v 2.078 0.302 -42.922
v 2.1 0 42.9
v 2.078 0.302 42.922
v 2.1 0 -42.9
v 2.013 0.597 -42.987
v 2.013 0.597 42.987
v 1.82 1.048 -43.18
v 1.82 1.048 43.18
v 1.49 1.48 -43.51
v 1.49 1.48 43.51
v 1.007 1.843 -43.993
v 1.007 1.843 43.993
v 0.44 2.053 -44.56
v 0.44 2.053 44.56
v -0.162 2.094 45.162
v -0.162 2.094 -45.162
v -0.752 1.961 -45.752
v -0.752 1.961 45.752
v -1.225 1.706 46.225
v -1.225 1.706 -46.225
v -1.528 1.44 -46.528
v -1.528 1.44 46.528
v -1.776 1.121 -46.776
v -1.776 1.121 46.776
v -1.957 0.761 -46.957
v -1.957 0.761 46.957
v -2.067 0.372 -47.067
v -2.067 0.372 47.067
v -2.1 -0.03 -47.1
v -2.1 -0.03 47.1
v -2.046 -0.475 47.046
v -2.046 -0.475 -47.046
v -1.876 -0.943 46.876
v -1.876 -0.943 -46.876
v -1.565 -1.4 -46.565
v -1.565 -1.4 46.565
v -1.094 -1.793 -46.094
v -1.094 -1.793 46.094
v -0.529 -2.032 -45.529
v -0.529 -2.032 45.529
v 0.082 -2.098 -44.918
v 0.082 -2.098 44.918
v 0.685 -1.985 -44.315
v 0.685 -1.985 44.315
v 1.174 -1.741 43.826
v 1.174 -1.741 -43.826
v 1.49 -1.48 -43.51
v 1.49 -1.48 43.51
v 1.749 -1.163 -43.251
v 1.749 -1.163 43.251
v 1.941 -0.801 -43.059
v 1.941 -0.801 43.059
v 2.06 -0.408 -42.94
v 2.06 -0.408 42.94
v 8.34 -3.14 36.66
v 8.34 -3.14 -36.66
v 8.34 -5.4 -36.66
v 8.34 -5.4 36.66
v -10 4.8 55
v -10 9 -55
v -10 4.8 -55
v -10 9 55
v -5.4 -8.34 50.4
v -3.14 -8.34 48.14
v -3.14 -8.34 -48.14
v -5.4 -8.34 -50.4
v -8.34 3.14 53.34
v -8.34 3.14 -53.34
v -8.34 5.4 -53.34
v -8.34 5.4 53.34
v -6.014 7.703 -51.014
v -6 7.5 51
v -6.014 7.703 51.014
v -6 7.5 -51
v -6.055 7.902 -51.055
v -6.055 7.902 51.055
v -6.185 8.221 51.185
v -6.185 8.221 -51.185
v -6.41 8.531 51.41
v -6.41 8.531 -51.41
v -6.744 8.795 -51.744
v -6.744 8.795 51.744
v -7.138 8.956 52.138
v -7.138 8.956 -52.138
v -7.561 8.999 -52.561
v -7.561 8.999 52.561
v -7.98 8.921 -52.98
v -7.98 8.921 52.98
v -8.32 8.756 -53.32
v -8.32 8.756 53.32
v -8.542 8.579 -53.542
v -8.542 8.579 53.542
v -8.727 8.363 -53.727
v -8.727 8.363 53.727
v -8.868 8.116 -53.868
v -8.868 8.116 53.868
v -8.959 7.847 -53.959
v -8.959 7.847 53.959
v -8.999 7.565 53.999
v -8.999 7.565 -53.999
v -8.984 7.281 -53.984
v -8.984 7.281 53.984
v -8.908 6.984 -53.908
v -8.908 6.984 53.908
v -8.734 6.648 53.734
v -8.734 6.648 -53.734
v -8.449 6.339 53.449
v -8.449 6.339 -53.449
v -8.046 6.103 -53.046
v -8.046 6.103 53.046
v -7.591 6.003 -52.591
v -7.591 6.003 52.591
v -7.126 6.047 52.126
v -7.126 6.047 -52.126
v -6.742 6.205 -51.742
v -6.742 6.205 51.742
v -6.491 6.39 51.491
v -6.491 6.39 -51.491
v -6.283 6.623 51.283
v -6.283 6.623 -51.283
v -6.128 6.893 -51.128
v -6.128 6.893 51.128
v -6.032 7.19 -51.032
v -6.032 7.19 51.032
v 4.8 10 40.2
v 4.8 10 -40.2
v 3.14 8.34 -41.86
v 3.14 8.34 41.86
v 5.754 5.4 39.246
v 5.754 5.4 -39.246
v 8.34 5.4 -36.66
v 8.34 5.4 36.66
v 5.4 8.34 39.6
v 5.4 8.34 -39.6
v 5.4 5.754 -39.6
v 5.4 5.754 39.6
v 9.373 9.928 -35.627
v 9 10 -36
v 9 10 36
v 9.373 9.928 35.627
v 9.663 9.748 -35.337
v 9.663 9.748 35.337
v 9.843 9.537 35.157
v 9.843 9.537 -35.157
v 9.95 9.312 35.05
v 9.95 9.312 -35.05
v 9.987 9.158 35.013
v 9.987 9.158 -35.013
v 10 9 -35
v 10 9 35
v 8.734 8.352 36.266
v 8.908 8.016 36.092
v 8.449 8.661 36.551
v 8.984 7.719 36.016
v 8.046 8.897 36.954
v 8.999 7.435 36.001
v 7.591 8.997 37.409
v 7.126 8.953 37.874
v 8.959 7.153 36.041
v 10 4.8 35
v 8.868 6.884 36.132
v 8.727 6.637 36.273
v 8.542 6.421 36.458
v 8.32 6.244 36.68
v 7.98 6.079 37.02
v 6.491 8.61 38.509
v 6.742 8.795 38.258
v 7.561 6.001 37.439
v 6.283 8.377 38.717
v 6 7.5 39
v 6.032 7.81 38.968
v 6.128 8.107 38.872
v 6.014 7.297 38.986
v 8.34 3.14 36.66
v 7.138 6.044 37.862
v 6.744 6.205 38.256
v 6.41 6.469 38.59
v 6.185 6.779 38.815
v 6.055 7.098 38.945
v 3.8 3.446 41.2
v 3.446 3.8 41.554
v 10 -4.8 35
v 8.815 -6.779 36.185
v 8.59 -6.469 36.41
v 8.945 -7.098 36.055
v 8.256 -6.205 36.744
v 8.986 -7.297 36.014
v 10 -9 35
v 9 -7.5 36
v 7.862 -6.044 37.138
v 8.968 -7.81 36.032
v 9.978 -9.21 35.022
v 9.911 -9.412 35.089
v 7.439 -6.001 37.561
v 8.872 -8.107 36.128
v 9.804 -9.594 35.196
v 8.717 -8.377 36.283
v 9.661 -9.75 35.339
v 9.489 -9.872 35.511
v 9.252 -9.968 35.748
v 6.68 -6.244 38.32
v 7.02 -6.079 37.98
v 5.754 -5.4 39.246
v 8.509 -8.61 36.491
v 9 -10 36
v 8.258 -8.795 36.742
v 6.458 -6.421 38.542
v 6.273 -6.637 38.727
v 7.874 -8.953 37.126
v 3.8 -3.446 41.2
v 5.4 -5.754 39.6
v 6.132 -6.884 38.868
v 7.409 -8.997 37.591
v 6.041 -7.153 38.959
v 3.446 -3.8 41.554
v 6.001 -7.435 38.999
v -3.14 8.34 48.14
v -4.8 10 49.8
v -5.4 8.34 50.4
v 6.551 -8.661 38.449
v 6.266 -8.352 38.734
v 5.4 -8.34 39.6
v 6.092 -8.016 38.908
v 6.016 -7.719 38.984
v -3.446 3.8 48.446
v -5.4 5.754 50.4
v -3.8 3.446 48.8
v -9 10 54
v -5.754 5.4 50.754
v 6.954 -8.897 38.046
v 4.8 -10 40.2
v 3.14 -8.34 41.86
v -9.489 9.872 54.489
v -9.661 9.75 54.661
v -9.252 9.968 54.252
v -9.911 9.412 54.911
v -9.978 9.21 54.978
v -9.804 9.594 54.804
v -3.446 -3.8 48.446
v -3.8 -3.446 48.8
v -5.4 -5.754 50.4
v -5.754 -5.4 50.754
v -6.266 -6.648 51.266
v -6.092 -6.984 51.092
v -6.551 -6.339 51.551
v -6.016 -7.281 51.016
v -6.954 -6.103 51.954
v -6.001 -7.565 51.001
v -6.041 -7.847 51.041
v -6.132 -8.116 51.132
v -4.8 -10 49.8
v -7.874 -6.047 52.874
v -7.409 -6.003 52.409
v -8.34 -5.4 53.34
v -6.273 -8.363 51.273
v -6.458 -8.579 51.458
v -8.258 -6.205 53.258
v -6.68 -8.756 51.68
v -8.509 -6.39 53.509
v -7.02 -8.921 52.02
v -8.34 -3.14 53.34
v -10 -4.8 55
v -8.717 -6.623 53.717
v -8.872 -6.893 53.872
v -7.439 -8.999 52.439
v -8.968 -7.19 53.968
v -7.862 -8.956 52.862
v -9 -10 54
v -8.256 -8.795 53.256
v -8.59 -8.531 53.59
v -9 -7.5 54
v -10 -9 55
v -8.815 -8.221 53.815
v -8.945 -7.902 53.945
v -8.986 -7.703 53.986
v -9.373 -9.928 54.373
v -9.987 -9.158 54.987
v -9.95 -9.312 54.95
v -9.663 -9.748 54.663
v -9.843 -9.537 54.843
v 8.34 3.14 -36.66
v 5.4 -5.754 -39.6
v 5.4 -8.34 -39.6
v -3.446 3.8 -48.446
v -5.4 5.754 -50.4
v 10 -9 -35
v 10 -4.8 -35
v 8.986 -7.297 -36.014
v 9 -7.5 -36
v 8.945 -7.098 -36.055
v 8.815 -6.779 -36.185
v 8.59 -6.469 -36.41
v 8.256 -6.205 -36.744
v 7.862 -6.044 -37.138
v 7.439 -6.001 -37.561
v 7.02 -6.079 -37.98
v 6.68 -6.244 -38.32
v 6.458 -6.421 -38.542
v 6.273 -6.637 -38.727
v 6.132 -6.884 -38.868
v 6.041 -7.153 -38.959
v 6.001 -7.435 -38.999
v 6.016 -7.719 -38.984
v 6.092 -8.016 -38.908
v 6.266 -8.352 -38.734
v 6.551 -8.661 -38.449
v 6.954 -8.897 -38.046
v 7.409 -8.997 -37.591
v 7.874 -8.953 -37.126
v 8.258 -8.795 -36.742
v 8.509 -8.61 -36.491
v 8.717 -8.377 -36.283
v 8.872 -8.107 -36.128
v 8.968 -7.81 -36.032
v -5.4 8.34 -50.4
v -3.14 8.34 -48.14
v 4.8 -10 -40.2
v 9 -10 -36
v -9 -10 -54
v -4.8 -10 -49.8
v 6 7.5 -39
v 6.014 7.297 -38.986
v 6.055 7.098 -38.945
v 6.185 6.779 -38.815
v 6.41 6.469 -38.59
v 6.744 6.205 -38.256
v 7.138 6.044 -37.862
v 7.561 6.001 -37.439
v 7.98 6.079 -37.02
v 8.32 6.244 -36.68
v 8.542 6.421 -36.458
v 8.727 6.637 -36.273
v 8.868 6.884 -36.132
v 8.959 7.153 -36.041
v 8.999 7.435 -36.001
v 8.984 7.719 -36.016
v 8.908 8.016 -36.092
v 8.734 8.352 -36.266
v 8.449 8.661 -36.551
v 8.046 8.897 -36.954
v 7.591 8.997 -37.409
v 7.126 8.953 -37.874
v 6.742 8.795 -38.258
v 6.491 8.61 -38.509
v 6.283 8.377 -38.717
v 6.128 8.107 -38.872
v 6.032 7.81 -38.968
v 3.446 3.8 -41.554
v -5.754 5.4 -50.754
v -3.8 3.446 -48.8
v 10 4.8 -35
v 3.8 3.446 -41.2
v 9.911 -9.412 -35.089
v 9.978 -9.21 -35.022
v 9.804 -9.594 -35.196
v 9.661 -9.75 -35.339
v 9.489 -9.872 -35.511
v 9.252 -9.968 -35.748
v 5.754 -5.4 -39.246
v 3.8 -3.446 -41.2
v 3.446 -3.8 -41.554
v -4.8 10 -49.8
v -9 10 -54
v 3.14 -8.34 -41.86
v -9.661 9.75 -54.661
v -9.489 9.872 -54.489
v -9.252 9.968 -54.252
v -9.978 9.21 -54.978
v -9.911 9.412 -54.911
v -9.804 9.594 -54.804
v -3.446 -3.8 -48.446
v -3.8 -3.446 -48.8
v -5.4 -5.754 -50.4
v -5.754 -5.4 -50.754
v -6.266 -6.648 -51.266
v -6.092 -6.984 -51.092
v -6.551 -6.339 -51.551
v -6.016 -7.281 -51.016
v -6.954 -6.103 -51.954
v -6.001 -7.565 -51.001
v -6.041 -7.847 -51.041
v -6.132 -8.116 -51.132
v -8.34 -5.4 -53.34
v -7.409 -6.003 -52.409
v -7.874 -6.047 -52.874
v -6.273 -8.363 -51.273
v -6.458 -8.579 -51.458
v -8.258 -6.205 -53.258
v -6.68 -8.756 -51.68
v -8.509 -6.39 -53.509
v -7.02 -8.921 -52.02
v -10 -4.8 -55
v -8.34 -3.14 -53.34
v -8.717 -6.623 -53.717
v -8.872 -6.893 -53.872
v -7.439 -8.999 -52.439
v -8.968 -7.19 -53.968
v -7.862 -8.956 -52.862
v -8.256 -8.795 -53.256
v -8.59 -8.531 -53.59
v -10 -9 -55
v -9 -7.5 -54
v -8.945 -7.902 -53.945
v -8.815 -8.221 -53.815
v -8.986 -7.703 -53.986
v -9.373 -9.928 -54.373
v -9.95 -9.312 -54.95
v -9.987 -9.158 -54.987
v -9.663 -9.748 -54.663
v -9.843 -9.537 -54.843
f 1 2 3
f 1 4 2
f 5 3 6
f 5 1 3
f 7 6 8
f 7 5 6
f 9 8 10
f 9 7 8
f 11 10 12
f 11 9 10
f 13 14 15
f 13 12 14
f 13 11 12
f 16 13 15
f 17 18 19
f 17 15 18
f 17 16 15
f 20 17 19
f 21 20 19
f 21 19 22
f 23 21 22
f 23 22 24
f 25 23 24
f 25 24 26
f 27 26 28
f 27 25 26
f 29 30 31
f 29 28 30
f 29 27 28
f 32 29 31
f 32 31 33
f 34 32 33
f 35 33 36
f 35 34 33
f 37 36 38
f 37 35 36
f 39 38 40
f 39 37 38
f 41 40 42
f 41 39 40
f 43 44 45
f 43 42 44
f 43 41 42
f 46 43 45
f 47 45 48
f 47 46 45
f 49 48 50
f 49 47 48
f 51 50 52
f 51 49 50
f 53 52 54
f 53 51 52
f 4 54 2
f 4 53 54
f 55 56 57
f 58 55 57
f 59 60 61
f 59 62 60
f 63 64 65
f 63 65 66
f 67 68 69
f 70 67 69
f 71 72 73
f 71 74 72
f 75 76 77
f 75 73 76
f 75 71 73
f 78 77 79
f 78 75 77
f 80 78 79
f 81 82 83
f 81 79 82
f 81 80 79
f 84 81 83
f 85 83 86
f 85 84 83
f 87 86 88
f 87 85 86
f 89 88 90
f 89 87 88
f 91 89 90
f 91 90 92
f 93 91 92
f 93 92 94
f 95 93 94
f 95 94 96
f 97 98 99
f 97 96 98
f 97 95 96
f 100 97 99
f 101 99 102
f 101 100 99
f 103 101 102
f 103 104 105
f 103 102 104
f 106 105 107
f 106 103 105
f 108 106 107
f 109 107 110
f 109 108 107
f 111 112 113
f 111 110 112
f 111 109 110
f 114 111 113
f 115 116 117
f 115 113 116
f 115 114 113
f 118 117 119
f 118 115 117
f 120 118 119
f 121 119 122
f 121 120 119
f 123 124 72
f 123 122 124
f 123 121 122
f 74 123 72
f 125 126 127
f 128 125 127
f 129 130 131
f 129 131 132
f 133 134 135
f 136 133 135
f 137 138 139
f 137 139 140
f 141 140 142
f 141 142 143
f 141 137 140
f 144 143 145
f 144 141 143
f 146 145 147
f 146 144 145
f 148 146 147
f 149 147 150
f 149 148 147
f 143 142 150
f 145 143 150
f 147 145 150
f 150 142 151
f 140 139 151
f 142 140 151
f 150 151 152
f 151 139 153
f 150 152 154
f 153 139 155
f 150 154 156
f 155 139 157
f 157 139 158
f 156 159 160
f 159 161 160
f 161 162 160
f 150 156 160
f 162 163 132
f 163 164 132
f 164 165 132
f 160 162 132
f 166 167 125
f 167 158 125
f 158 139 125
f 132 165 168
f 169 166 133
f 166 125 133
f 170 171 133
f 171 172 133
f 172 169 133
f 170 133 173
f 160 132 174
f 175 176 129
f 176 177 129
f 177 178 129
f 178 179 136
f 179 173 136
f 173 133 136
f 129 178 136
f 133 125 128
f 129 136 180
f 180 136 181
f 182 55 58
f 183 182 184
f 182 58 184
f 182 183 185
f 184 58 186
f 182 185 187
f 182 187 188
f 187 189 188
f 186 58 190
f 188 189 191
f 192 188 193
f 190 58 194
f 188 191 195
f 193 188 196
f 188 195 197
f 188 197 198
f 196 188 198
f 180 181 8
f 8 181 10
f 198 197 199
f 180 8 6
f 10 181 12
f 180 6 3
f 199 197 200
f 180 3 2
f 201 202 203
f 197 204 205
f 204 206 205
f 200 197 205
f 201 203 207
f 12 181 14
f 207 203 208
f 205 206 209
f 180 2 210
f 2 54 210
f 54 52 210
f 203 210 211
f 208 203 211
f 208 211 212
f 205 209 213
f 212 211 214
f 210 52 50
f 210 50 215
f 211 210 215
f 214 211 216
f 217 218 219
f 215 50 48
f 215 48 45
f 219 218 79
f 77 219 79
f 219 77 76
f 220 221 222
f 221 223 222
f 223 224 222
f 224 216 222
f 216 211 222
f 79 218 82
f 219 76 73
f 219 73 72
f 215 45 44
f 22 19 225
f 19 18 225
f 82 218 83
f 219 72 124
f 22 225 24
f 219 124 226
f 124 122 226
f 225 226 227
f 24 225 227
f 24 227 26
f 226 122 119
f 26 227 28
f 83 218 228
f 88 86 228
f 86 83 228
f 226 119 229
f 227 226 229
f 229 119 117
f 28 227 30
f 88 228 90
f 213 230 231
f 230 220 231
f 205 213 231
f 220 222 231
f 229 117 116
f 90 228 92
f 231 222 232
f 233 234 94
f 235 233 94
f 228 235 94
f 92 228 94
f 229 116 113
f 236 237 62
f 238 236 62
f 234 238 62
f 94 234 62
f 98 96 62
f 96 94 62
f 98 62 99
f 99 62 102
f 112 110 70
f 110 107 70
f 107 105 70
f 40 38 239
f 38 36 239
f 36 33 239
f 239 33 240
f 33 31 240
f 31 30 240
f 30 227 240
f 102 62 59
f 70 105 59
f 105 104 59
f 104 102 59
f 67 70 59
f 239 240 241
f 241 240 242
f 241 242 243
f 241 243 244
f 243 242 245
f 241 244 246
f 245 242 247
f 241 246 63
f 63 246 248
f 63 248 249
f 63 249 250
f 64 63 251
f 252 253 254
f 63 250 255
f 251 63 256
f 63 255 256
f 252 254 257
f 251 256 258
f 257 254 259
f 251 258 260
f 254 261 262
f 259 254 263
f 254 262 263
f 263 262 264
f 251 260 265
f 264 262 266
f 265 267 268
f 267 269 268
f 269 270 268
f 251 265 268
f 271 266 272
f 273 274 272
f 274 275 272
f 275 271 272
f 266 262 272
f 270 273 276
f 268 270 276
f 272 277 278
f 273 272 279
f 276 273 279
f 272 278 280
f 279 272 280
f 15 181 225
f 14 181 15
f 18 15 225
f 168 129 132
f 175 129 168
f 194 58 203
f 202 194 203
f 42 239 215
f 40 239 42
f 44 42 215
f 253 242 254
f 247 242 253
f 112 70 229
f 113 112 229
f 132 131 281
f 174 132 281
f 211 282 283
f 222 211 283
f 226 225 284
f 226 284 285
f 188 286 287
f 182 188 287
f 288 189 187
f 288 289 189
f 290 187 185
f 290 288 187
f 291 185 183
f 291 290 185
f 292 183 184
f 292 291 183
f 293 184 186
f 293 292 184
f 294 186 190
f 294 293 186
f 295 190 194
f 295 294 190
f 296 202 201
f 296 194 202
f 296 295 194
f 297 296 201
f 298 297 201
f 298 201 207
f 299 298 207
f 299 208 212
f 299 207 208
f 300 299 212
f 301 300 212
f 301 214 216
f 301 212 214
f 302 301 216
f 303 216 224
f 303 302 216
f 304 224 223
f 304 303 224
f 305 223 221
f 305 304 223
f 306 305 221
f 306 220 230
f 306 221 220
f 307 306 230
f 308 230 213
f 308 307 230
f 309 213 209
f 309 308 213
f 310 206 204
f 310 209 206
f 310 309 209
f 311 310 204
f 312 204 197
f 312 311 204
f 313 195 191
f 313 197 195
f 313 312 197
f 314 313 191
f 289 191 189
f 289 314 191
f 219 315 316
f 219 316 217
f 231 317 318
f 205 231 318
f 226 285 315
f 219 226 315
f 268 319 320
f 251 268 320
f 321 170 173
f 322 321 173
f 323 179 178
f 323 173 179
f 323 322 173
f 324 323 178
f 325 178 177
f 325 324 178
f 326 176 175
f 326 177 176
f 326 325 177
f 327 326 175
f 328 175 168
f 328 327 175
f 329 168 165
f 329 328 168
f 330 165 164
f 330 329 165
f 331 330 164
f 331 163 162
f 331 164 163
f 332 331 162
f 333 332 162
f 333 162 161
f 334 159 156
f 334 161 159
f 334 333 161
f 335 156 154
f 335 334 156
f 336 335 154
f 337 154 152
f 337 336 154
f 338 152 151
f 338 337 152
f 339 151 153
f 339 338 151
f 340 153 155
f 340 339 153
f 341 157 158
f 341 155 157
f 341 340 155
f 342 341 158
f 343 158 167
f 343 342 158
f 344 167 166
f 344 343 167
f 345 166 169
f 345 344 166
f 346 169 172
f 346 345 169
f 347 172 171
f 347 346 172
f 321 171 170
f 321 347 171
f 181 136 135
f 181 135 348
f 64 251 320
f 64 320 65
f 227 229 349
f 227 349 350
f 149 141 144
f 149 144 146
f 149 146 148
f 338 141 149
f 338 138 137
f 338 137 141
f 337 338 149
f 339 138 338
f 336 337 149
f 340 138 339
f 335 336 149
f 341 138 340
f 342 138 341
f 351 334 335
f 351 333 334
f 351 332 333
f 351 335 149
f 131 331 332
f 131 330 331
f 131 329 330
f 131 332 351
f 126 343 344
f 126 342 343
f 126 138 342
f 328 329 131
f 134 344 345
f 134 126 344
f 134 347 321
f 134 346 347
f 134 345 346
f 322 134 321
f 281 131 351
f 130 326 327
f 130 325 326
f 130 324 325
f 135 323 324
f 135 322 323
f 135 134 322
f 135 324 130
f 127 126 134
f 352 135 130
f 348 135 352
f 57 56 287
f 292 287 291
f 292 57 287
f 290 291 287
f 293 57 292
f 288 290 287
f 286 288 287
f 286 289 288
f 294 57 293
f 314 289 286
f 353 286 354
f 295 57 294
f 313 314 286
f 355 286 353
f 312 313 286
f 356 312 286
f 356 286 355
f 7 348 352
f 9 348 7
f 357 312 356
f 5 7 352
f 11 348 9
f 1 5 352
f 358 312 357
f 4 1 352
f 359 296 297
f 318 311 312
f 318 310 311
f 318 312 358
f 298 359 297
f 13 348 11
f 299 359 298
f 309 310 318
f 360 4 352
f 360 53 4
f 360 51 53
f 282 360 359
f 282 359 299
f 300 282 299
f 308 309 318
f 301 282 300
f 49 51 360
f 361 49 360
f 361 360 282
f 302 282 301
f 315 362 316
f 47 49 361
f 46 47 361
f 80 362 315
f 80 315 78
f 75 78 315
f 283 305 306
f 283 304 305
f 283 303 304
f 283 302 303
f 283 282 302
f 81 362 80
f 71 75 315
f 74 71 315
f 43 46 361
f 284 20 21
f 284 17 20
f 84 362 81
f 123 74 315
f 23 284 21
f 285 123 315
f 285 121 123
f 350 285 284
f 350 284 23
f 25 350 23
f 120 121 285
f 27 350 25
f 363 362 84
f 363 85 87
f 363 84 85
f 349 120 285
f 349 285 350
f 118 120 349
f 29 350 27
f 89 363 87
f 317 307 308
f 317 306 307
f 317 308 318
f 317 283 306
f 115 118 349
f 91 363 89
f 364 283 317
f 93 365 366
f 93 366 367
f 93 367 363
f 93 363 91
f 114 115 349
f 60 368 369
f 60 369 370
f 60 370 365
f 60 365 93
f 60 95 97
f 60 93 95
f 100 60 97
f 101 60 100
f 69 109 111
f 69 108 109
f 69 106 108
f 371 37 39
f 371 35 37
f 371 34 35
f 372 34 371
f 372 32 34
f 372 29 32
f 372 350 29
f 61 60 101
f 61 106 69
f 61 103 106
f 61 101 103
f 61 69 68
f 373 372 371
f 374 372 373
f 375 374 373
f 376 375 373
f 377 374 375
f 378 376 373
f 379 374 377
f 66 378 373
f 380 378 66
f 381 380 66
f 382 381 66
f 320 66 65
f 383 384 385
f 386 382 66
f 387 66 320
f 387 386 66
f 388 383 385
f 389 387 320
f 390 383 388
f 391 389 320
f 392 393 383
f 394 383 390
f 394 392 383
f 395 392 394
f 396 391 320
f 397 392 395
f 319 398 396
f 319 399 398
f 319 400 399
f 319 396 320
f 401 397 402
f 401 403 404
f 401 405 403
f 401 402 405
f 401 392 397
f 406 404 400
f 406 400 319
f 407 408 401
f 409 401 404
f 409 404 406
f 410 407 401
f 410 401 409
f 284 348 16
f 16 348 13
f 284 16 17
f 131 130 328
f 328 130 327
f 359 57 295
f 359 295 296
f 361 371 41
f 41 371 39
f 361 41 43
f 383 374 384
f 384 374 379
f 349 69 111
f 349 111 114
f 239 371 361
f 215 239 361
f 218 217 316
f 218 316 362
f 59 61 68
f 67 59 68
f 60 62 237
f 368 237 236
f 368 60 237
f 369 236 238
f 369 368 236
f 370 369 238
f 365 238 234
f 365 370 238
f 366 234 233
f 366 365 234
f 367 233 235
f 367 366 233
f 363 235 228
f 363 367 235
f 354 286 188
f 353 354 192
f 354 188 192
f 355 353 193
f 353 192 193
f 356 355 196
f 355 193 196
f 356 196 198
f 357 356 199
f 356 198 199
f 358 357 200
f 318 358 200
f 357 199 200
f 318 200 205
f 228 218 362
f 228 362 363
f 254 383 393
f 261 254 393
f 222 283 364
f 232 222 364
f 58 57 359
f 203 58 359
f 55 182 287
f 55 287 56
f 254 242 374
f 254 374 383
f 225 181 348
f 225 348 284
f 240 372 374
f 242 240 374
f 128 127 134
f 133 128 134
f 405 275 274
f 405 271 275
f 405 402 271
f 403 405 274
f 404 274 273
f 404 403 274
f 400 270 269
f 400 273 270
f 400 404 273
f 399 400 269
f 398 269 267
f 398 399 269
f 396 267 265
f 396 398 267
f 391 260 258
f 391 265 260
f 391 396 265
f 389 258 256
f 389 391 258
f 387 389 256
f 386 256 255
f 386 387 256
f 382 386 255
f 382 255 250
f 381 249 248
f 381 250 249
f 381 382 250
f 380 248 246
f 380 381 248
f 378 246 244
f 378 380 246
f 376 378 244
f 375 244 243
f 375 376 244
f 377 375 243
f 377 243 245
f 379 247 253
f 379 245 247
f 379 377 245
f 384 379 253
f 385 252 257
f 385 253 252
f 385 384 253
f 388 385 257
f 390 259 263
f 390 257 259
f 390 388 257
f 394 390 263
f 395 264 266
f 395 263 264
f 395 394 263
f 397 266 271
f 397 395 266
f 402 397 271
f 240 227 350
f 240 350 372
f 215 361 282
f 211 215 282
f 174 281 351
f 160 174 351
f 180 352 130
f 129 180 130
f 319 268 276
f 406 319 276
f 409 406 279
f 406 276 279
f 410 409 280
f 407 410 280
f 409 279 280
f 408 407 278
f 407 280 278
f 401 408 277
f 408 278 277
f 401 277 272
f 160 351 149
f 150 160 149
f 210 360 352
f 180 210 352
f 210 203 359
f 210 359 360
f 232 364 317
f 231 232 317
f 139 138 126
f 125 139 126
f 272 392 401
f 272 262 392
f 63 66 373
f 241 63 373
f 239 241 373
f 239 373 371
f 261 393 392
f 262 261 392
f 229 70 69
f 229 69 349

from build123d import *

# Parameters (mm, degrees)
SKETCH_1_R          = 1.5
SKETCH_1_R_2        = 2.1
EXTRUDE_1_DEPTH     = 55
FILLET_1_R          = 1
CUT_EXTRUDE_1_REACH = 99.788
SKETCH_2_W          = 29.048666984
SKETCH_2_H          = 34.015307271


with BuildPart() as part:
    # 草图1 → 凸台-拉伸1 (new, symmetric)
    with BuildSketch(Plane.XY):
        Polygon((-10, 10), (-10, 4.8), (-8.34, 3.14), (-8.34, 5.4), (-5.753553391, 5.4), (-3.8, 3.446446609), (-3.8, -3.446446609), (-5.753553391, -5.4), (-8.34, -5.4), (-8.34, -3.14), (-10, -4.8), (-10, -10), (-4.8, -10), (-3.14, -8.34), (-5.4, -8.34), (-5.4, -5.753553391), (-3.446446609, -3.8), (3.446446609, -3.8), (5.4, -5.753553391), (5.4, -8.34), (3.14, -8.34), (4.8, -10), (10, -10), (10, -4.8), (8.34, -3.14), (8.34, -5.4), (5.753553391, -5.4), (3.8, -3.446446609), (3.8, 3.446446609), (5.753553391, 5.4), (8.34, 5.4), (8.34, 3.14), (10, 4.8), (10, 10), (4.8, 10), (3.14, 8.34), (5.4, 8.34), (5.4, 5.753553391), (3.446446609, 3.8), (-3.446446609, 3.8), (-5.4, 5.753553391), (-5.4, 8.34), (-3.14, 8.34), (-4.8, 10), align=None)
        with Locations((-7.5, 7.5)):
            Circle(SKETCH_1_R, mode=Mode.SUBTRACT)
        Circle(SKETCH_1_R_2, mode=Mode.SUBTRACT)
        with Locations(Location((-7.5, -7.5, 0), (0, 0, 180))):
            Circle(SKETCH_1_R, mode=Mode.SUBTRACT)
        with Locations((7.5, -7.5)):
            Circle(SKETCH_1_R, mode=Mode.SUBTRACT)
        with Locations(Location((7.5, 7.5, 0), (0, 0, 180))):
            Circle(SKETCH_1_R, mode=Mode.SUBTRACT)
    extrude(amount=EXTRUDE_1_DEPTH, both=True)

    # 圆角1
    fillet_1_edges = [part.edges().sort_by_distance(p)[0] for p in [
        (10, 10, 0),
        (10, -10, 0),
        (-10, -10, 0),
        (-10, 10, 0),
    ]]
    fillet(fillet_1_edges, radius=FILLET_1_R)

    # 草图2 → 切除-拉伸1 (cut, up to next)
    with BuildSketch(Plane(origin=(-32.5, 0, -32.5), x_dir=(0, -1, 0), z_dir=(0.7071067811865464, 0, 0.7071067811865488)), mode=Mode.PRIVATE) as cut_extrude_1_sk1:
        with Locations((-4.05016126, 48.827458789)):
            Rectangle(SKETCH_2_W, SKETCH_2_H)
    cut_extrude_1_tool1 = extrude(cut_extrude_1_sk1.sketch, amount=CUT_EXTRUDE_1_REACH, mode=Mode.PRIVATE) & part.part
    cut_extrude_1 = cut_extrude_1_tool1.solids().sort_by_distance((2.026227, 4.050161, -67.026227))[0]
    add(cut_extrude_1, mode=Mode.SUBTRACT)

    # 镜向1: 切除-拉伸1 across plane
    add(cut_extrude_1.mirror(Plane(origin=(0, 0, 0), x_dir=(1, 0, 0), z_dir=(0, 0, -1))), mode=Mode.SUBTRACT)


solid = part.part
